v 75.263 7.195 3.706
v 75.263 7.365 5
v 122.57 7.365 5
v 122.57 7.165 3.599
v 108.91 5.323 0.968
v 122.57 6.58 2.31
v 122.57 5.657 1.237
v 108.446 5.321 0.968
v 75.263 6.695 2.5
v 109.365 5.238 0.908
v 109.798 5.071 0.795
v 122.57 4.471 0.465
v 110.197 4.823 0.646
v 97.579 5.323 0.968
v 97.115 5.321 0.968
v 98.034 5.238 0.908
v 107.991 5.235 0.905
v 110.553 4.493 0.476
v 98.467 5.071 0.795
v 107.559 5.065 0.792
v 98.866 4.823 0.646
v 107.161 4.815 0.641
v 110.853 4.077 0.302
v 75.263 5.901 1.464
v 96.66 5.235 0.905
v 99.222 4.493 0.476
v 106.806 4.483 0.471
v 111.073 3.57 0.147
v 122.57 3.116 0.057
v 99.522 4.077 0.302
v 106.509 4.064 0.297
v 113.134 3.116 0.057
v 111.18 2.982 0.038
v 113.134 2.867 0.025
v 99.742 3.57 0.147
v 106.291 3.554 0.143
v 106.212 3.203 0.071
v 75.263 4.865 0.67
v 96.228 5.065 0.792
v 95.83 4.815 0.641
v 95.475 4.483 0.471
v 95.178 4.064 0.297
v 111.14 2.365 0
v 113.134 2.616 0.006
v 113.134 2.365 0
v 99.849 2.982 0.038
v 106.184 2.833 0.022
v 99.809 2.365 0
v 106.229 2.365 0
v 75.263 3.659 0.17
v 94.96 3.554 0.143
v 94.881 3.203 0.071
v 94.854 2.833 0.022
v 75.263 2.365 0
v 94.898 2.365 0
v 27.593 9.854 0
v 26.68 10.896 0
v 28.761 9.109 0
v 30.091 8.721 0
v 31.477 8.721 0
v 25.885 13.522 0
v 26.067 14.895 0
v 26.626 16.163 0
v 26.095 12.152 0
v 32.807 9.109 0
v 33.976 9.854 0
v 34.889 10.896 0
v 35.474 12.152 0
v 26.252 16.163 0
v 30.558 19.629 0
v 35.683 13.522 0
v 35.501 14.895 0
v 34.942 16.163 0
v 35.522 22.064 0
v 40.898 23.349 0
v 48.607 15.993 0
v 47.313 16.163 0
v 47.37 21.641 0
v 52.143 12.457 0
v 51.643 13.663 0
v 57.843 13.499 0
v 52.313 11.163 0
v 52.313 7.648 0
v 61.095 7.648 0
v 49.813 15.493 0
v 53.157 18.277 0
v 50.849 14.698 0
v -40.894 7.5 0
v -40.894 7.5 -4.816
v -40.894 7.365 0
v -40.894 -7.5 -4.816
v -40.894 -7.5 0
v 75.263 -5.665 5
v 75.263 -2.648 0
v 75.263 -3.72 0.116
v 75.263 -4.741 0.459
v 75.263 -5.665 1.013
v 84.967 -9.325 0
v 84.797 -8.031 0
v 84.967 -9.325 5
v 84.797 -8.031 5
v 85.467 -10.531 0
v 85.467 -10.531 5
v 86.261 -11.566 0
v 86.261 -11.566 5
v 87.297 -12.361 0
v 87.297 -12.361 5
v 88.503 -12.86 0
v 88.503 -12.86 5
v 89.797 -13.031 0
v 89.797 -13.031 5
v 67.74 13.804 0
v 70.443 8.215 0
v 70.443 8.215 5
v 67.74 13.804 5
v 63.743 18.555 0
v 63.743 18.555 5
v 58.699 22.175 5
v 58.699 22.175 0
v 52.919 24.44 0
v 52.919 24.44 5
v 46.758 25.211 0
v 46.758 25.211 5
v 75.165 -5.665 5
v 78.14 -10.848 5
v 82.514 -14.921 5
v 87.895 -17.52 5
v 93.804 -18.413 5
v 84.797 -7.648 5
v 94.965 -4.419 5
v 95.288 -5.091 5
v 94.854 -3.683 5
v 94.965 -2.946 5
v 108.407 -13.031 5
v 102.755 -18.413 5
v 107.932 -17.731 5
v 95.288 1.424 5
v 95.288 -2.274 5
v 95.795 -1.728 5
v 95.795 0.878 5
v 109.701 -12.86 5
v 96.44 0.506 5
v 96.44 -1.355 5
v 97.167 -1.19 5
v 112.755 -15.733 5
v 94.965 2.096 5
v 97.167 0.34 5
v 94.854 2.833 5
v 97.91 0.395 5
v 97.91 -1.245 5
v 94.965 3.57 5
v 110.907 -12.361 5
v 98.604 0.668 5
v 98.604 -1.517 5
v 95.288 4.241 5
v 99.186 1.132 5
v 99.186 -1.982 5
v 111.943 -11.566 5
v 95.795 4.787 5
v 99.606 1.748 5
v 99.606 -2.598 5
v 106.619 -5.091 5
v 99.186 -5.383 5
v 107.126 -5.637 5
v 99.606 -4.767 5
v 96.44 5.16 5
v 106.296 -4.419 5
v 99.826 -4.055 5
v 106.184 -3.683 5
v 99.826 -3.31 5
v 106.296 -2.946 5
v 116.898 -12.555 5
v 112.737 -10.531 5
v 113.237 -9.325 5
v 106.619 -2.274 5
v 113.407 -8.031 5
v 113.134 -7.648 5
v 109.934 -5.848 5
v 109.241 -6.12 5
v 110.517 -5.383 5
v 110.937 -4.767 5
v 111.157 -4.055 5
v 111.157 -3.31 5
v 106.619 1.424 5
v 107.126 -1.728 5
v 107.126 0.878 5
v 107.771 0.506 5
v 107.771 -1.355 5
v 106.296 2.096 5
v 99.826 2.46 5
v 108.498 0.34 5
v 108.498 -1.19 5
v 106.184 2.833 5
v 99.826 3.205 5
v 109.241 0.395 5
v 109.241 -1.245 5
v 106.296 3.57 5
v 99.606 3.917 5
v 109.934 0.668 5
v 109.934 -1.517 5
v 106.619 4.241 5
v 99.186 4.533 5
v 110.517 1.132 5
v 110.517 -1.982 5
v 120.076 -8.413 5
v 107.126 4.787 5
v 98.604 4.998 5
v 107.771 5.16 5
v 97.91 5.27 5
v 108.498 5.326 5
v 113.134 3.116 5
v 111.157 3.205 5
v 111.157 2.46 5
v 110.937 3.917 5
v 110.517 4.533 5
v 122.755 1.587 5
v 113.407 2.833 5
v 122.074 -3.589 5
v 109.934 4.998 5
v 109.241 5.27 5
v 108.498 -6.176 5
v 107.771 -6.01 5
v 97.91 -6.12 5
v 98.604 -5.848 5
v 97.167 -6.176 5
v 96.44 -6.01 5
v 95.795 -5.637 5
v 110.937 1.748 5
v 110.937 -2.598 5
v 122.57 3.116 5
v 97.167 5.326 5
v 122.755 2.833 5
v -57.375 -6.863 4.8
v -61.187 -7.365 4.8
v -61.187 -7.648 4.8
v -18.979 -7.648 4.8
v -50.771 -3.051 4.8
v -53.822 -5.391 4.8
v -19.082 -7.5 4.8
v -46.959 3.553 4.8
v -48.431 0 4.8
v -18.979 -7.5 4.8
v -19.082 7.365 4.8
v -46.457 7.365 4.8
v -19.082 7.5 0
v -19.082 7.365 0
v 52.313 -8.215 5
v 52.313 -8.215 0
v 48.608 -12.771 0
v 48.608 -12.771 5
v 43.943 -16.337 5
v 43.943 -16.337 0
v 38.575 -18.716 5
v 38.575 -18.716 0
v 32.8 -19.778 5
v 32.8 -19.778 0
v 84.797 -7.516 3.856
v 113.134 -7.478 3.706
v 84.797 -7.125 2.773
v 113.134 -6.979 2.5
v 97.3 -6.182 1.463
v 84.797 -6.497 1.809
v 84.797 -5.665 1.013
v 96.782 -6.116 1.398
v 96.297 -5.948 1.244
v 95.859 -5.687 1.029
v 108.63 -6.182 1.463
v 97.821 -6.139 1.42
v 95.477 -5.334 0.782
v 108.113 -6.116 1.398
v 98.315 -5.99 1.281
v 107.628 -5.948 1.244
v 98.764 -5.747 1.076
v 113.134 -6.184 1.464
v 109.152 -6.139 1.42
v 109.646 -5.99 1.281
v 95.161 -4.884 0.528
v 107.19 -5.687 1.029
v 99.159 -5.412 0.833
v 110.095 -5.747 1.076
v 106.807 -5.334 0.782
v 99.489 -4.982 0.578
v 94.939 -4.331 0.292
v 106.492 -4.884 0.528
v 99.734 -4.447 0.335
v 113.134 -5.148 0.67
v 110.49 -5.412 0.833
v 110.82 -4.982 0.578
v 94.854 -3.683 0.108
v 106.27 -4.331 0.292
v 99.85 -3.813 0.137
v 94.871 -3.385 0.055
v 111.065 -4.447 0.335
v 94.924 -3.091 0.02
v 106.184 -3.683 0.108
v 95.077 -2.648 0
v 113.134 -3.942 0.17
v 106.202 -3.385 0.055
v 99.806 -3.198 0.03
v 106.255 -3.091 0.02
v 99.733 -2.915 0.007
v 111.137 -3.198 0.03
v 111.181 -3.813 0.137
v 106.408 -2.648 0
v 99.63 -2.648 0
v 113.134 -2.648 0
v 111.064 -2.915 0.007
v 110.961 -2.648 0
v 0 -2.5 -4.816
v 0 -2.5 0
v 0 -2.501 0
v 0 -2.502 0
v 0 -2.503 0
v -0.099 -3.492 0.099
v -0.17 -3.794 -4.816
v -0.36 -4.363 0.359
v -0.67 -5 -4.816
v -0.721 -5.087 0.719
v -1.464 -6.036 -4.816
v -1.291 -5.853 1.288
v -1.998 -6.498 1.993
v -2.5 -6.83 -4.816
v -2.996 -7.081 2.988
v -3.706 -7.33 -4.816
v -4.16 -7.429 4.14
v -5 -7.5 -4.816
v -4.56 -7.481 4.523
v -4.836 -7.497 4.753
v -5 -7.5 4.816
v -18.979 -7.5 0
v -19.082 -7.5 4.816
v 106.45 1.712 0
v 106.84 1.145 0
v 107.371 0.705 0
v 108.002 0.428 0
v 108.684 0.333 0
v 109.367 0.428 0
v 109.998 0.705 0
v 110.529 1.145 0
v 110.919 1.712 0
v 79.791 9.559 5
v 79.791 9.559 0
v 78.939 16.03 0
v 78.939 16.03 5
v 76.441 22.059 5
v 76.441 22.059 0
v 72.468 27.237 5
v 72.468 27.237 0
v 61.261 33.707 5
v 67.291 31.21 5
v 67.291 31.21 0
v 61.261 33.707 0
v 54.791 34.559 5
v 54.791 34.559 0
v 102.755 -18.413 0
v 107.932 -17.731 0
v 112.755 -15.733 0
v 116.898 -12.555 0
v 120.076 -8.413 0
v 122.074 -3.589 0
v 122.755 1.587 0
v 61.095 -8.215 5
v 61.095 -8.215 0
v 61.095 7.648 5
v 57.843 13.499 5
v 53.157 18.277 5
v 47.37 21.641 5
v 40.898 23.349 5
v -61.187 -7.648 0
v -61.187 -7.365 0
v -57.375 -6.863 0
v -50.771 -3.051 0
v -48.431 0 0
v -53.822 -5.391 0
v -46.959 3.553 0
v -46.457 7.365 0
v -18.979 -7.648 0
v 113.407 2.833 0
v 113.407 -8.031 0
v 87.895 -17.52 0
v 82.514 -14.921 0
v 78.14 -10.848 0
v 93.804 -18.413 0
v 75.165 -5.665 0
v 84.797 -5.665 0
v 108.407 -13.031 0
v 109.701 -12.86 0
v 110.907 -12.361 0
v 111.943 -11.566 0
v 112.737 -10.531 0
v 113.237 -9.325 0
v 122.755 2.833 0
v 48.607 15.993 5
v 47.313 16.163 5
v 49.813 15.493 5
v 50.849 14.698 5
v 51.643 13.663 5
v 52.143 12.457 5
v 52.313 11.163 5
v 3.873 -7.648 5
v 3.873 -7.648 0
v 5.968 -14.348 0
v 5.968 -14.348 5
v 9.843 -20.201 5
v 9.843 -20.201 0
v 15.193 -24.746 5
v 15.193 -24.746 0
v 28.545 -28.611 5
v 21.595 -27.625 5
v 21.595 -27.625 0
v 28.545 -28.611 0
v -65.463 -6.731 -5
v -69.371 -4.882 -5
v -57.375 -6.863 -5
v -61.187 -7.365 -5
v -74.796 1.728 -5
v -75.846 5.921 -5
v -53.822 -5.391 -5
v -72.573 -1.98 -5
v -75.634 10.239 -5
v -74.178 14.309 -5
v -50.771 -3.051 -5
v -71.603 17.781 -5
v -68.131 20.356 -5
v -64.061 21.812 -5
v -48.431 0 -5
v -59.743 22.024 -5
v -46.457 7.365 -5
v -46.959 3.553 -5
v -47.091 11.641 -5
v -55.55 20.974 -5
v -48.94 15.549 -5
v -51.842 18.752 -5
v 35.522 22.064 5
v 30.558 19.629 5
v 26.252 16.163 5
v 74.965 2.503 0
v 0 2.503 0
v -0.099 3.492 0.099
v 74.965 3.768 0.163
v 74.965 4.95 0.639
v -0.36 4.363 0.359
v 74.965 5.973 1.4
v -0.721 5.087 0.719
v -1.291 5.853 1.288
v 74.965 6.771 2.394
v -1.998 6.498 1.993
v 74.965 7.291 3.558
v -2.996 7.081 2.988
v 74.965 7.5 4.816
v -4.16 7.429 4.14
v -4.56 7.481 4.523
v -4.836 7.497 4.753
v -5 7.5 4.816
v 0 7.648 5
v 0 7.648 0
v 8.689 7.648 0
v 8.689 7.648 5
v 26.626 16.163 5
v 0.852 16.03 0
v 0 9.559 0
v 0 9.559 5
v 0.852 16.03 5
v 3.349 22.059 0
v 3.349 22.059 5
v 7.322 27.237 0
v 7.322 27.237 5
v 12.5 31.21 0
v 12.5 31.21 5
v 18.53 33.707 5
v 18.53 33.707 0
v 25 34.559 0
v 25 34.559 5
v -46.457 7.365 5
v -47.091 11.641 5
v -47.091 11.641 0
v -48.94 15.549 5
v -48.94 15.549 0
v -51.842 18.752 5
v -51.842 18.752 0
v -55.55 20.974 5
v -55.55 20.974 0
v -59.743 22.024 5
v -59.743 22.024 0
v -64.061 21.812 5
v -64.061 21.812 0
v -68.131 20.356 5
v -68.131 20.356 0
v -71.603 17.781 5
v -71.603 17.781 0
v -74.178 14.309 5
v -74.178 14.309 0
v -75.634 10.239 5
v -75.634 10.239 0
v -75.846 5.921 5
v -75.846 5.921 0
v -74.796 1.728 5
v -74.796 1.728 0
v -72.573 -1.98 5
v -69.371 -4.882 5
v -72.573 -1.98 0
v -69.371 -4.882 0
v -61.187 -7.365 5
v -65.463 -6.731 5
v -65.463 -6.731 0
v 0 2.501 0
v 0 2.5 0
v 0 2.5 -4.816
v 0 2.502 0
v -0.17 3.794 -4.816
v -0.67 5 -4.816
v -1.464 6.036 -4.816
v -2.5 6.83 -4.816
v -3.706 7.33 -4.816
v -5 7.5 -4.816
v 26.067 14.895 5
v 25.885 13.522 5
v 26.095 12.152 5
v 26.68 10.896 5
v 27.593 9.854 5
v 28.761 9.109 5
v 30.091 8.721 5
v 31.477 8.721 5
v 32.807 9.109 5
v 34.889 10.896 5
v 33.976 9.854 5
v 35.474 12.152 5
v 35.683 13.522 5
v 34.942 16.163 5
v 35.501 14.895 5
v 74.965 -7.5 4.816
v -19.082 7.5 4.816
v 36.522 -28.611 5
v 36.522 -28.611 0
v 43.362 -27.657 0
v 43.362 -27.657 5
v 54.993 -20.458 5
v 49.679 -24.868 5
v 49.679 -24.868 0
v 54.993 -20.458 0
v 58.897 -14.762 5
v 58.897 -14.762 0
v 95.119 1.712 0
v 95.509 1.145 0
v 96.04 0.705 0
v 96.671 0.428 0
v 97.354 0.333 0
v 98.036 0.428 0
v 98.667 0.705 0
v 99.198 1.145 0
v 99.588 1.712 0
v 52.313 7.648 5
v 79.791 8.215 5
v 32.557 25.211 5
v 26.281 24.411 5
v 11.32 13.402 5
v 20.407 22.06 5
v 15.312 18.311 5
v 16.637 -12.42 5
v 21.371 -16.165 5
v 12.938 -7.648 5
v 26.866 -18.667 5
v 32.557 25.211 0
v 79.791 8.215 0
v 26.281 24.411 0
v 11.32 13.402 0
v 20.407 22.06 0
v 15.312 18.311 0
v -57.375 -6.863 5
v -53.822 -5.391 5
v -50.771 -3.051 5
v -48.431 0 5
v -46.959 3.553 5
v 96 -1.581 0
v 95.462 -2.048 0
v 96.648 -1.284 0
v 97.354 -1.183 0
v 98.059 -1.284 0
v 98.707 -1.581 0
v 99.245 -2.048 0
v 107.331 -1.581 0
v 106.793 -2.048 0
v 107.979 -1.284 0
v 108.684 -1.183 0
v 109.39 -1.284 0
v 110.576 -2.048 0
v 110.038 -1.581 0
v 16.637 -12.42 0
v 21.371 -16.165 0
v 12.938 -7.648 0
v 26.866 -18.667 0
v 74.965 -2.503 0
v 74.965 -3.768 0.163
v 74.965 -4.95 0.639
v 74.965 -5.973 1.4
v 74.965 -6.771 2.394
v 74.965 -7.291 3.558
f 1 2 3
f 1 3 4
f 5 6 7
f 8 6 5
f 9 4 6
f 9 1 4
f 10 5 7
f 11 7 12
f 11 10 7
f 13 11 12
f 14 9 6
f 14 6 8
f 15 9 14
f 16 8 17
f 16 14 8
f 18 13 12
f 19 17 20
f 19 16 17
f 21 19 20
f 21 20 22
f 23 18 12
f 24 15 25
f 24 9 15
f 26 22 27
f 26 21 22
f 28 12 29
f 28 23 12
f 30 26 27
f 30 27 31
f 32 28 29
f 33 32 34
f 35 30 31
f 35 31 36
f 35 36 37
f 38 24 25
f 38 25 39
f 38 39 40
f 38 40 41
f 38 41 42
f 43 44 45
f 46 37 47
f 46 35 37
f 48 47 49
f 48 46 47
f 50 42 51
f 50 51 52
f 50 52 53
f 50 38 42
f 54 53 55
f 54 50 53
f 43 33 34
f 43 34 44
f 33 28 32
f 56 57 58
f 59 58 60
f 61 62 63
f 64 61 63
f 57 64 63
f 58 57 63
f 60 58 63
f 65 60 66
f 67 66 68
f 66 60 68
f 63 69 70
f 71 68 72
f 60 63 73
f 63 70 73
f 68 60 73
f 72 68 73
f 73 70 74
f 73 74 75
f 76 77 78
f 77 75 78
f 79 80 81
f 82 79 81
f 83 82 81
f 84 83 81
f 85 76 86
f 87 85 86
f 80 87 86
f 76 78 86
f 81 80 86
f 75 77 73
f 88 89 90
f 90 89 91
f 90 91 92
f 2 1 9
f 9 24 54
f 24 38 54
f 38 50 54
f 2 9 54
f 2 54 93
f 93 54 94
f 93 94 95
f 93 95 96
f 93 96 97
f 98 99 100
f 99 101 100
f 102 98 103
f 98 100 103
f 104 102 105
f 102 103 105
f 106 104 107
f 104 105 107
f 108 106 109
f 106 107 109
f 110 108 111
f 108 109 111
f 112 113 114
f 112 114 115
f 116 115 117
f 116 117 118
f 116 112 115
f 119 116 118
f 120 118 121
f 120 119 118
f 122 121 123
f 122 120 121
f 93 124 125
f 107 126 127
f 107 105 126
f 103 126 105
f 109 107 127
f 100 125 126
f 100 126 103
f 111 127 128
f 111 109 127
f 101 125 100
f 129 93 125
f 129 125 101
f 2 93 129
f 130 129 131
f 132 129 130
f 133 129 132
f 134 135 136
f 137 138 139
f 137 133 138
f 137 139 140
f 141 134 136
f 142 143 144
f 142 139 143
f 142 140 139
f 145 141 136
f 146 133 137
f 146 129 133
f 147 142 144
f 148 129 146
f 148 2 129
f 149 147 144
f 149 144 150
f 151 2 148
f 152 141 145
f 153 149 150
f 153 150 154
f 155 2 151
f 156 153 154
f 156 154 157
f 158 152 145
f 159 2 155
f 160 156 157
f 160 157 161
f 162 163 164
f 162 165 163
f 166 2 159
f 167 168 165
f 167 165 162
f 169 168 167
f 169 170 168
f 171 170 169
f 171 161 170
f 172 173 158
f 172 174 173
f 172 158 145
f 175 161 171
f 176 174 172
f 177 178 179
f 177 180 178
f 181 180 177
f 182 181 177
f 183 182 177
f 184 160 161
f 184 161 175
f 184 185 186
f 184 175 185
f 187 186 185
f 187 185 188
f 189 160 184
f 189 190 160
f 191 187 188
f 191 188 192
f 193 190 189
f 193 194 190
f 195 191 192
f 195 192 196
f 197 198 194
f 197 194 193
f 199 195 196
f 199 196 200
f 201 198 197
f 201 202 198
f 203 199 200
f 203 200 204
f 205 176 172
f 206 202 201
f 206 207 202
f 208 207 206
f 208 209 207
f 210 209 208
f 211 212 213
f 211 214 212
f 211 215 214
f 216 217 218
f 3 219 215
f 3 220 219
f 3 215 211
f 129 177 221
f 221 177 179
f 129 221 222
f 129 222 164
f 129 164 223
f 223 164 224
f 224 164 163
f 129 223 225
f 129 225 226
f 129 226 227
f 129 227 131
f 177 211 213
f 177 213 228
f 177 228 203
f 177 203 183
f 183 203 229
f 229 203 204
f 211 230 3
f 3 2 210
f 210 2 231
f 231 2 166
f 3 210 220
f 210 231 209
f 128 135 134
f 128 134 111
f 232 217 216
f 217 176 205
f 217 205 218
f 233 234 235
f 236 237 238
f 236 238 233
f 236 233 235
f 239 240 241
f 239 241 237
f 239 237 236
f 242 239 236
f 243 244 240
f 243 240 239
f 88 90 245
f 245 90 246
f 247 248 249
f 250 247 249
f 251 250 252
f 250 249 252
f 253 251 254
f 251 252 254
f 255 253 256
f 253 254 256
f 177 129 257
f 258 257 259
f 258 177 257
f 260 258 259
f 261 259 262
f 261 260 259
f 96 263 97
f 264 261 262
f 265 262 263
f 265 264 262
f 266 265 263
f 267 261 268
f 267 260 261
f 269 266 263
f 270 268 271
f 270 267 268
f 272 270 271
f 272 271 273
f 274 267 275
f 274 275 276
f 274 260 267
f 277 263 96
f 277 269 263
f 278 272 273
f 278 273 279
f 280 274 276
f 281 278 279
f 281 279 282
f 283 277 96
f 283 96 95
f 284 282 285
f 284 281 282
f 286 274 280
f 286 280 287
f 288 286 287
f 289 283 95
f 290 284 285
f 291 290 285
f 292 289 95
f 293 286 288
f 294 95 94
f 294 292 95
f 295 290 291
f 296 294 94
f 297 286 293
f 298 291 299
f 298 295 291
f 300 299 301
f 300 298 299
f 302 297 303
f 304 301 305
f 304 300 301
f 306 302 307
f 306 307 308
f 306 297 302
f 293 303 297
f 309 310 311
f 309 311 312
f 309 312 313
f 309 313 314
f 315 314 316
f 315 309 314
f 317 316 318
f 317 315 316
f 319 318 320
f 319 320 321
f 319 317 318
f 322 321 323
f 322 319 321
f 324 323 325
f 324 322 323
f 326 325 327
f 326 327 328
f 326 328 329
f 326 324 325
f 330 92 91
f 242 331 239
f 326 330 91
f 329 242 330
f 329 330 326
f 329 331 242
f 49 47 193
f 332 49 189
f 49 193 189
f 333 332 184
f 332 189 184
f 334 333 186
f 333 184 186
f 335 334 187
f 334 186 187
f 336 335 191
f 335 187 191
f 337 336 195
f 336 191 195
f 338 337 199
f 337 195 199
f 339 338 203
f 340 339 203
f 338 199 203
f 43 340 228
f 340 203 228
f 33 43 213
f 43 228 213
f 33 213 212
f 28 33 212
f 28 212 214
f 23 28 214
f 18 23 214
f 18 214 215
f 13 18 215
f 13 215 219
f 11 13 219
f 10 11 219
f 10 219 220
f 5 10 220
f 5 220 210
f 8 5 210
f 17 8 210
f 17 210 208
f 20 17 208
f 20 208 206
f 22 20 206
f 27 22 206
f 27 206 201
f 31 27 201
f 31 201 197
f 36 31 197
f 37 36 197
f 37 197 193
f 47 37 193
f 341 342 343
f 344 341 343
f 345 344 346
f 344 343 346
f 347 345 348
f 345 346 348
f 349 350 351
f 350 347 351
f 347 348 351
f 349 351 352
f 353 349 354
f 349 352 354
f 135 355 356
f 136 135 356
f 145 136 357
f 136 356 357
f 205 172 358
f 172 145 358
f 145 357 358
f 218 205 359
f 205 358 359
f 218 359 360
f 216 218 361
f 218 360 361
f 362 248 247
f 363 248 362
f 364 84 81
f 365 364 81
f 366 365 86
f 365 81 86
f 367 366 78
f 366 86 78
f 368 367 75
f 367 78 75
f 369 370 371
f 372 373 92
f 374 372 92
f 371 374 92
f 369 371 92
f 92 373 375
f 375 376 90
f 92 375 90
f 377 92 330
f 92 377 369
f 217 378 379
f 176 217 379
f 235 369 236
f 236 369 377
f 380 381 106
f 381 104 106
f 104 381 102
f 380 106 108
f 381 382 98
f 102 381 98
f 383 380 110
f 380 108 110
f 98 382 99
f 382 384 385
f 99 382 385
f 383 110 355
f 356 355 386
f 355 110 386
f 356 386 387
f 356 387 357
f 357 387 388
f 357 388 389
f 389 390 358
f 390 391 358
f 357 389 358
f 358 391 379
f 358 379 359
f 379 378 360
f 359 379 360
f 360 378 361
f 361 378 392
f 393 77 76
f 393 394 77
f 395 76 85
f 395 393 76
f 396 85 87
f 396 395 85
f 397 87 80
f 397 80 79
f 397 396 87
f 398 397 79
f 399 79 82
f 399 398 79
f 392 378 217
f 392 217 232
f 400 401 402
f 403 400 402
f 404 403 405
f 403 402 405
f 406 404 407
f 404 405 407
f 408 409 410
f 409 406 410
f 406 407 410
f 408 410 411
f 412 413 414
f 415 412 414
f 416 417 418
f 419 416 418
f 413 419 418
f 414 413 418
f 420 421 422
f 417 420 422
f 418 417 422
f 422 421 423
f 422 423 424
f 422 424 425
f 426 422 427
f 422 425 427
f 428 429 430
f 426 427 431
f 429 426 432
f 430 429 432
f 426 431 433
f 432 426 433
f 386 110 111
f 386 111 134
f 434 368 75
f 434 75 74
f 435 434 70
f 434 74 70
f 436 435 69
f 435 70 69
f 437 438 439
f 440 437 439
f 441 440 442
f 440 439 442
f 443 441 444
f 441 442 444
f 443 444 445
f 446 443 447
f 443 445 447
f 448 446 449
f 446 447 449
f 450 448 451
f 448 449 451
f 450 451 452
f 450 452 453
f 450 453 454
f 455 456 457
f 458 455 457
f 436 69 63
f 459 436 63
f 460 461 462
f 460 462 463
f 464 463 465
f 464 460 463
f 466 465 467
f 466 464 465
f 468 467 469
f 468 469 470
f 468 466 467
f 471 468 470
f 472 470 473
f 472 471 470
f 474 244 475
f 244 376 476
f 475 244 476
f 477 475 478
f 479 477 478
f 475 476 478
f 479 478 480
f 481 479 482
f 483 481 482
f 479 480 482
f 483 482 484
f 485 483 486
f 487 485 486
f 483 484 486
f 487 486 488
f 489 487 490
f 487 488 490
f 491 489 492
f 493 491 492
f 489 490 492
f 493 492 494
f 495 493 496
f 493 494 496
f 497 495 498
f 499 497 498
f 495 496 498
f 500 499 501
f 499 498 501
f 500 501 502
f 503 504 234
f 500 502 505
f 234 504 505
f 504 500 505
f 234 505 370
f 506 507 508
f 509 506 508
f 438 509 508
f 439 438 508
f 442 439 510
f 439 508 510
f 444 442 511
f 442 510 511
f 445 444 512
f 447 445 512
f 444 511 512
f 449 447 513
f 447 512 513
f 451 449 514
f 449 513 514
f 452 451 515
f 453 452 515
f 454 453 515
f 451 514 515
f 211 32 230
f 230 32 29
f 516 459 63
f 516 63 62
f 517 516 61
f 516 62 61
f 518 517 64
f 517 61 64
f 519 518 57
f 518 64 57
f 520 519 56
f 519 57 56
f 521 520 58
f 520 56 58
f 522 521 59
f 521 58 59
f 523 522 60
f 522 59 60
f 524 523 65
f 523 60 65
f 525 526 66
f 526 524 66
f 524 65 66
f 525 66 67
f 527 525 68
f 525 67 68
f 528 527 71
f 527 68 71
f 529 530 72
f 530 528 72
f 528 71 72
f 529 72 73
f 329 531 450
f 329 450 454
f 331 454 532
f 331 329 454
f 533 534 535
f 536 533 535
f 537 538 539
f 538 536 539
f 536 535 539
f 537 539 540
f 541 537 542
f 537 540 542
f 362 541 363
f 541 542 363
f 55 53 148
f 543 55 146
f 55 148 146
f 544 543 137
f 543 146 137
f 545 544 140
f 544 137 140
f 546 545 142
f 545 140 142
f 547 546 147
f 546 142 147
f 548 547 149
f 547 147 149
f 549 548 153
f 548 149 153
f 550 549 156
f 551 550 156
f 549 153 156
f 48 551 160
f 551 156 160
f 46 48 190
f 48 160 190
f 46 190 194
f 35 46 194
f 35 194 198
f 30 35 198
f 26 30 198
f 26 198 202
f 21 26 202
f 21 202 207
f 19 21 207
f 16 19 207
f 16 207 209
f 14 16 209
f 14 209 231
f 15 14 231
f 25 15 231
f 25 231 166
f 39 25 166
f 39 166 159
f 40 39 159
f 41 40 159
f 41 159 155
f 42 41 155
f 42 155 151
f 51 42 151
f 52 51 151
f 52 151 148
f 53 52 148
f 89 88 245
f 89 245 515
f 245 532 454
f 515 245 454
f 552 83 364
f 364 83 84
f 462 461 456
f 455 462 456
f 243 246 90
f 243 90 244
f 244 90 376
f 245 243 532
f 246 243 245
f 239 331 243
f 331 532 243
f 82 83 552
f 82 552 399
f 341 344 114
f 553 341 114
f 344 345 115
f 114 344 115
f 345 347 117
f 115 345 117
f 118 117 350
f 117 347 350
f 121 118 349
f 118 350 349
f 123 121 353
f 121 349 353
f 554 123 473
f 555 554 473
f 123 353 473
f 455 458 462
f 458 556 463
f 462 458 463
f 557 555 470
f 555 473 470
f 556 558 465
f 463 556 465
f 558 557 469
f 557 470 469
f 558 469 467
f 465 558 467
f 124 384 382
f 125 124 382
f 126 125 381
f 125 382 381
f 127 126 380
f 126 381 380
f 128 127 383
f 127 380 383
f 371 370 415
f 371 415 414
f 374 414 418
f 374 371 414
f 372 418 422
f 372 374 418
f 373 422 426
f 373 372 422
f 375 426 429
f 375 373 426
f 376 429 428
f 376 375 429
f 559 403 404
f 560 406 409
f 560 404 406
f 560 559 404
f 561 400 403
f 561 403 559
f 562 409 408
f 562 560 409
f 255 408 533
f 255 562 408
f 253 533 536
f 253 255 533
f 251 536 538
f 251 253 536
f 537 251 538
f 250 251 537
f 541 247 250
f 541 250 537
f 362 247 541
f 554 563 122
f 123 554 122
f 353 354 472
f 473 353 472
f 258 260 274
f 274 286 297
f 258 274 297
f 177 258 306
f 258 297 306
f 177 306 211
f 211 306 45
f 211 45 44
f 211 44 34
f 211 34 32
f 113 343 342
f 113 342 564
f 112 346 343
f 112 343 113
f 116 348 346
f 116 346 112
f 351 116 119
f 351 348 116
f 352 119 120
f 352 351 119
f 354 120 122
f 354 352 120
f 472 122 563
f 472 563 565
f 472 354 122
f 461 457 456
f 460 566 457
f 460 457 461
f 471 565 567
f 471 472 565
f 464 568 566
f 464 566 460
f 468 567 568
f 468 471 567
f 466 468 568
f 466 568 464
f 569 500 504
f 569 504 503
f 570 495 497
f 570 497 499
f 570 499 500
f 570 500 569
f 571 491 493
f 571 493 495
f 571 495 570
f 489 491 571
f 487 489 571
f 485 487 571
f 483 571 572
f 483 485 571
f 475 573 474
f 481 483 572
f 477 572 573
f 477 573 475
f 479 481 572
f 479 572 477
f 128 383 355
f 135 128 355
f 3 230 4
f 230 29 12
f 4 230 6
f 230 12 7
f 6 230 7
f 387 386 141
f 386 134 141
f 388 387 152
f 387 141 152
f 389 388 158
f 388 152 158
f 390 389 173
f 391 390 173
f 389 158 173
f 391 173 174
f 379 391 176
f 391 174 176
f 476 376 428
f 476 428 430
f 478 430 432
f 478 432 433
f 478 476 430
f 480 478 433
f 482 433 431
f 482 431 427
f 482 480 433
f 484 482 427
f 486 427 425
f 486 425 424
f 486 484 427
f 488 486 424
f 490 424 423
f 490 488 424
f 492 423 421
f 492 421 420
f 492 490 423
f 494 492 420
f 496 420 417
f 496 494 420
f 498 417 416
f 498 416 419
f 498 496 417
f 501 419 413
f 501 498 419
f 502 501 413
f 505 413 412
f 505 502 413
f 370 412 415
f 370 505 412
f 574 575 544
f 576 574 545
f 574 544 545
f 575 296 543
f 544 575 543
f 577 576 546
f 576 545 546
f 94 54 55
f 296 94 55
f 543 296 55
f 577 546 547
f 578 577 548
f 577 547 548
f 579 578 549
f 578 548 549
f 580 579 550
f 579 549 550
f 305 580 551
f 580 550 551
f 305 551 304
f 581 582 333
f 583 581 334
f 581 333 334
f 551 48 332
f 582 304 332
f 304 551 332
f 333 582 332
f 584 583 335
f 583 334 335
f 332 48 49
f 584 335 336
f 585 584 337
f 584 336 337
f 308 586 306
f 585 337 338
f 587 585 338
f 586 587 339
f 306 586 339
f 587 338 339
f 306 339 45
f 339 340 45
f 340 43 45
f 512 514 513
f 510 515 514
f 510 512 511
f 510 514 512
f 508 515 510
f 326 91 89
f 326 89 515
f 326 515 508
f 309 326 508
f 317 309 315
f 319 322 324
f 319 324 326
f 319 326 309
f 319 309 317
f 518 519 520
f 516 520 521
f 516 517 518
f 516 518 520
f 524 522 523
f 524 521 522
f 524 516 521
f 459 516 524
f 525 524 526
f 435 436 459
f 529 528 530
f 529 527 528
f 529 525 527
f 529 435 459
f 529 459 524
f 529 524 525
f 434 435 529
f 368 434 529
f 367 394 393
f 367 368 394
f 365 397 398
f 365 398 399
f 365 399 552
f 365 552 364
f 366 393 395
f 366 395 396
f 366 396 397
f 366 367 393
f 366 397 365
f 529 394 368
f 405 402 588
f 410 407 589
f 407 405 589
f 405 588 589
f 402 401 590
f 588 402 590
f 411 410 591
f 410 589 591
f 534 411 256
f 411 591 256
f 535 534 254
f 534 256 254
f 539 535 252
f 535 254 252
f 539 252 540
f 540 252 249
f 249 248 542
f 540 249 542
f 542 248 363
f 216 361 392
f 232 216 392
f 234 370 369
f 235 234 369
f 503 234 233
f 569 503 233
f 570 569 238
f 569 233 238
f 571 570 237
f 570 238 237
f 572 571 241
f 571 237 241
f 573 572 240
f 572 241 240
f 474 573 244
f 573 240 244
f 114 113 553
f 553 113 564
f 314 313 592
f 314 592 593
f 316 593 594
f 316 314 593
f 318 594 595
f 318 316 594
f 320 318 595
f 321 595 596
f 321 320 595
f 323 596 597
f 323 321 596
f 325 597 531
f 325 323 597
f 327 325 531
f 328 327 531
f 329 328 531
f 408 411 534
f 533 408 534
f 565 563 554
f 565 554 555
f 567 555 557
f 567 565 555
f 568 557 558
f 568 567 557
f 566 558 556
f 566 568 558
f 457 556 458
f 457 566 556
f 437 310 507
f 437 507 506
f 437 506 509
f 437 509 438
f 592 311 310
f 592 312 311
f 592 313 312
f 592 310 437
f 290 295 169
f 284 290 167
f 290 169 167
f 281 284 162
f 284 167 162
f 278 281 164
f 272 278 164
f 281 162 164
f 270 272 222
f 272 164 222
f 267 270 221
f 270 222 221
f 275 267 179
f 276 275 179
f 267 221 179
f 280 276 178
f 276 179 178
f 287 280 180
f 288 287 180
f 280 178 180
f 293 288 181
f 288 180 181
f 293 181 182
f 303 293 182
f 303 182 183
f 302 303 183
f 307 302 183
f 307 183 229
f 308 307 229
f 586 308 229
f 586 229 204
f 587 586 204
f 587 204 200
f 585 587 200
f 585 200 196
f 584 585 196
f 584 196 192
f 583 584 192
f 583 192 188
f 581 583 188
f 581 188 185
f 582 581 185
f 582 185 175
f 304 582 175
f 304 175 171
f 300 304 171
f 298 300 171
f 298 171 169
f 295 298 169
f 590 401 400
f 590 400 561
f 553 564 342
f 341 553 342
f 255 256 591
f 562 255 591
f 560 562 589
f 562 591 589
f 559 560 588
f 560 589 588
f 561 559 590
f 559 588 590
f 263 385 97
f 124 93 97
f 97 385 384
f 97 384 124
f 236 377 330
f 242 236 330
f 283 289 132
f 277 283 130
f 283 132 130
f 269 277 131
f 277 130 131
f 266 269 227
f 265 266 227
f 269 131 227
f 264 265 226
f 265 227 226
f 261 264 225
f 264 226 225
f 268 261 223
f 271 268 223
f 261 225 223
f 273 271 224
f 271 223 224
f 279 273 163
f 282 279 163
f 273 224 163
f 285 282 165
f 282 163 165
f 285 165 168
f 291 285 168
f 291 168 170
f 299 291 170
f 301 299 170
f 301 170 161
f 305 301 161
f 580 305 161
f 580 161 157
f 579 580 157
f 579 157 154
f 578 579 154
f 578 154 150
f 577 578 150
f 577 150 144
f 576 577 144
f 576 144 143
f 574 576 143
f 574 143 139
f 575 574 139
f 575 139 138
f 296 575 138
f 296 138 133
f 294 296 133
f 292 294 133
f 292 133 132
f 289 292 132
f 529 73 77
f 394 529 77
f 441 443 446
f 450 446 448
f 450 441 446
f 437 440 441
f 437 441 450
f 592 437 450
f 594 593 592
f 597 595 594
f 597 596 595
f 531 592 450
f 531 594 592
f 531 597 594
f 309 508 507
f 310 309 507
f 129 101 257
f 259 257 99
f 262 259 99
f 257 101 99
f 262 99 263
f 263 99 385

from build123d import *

# Parameters (mm, degrees)
F0_W           = 74.9647691846
F0_H           = 4.8156478442
F0_W_2         = 21.8120515347
F1_DEPTH       = 7.5
F2_T1_DEPTH    = 87.4562698657
F2_T3_DEPTH    = 17.3156478442
F2_T9_DEPTH    = 87.4562698657
F2_T13_DEPTH   = 17.3156478442
F2_T21_DEPTH   = 87.4562698657
F2_T25_DEPTH   = 17.3156478442
F4_DEPTH       = 4.8
F5_DEPTH       = 5
F6_W           = 9.4357505441
F6_H           = 4.2491005734
F7_DEPTH       = 5
F8_R           = 4.99999
F9_W           = 9.3480274081
F9_H           = 5.3821951151
F9_W_2         = 9.3480348587
F9_H_2         = 4.8156473786
F9_H_3         = 5.5238311179
F9_W_3         = 28.6106020212
F10_DEPTH      = 5
F11_T1_DEPTH   = 98.1931302685
F11_T3_DEPTH   = 105
F13_D          = 5
F14_D          = 5
F15_D          = 5
F16_D          = 5
F17_W          = 9.3480274081
F17_H          = 16.9964022934
F17_W_2        = 61.7535989732
F17_H_2        = 9.3480236828
F18_DEPTH      = 5
F17_W_3        = 9.0647486504
F17_H_3        = 12.1807572432
F17_H_4        = 8.7814740837
F17_W_4        = 39.374999702
F17_W_5        = 8.7814815342
F17_H_5        = 11.6142109036
F17_H_6        = 8.5145081393
F17_W_6        = 26.0611474514
F17_H_7        = 7.3767574504
F19_T1_DEPTH   = 5
F19_T3_DEPTH   = 5
F19_T5_DEPTH   = 130
F19_T7_DEPTH   = 130
F19_2_T1_DEPTH = 5
F19_2_T3_DEPTH = 127.8617396979
F19_2_T5_DEPTH = 128.3588691726
F19_3_T1_DEPTH = 121.4077915609
F19_3_T3_DEPTH = 93.6596472526
F20_R          = 4.8994331179
F21_DEPTH      = 5
F22_R          = 5
F22_2_R        = 5


# Not quite as in the source:
# - a fillet or chamfer that OpenCascade refuses, or shapes differently, is made with other operations: its cross-section is extruded or revolved along the edge and cut away or added
# - a fillet or chamfer is up to 0.001 mm smaller than in the source, because OpenCascade refuses the exact size


with BuildPart() as f1:
    # F0 (on Front) → F1 (new body, symmetric)
    with BuildSketch(Plane.XZ):
        with Locations((37.4823845923, 2.4078239221)):
            Rectangle(F0_W, F0_H)
        Polygon((0, -4.8156478442), (0, 0), (0, 4.8156478442), (-19.0819986165, 4.8156478442), (-19.0819986165, 0), (-19.0819986165, -4.8156478442), align=None)
        with Locations((-29.9880243838, -2.4078239221)):
            Rectangle(F0_W_2, F0_H)
    extrude(amount=F1_DEPTH, both=True)

    # F2: fillet of radius 5 on 4 edges, made by hand

    # F2_s2 → F2_t1 (cut)
    with BuildSketch(Plane.YZ):
        with BuildLine():
            ThreePointArc((-2.5033997275, 0), (-5.9731431778, 1.3998777258), (-7.5, 4.8156478442))
            Line((-7.5, 4.8156478442), (-7.5, 0))
            Line((-7.5, 0), (-2.5033997275, 0))
        make_face()
        with BuildLine():
            ThreePointArc((2.5033997275, 0), (5.9731431778, 1.3998777258), (7.5, 4.8156478442))
            Line((7.5, 4.8156478442), (7.5, 0))
            Line((7.5, 0), (2.5033997275, 0))
        make_face()
    extrude(amount=F2_T1_DEPTH, mode=Mode.SUBTRACT)

    # F2_s4 → F2_t3 (cut)
    with BuildSketch(Plane.XY.offset(-17.3156478442)):
        with BuildLine():
            ThreePointArc((0, -2.5), (-1.4644660941, -6.0355339059), (-5, -7.5))
            Line((-5, -7.5), (0, -7.5))
            Line((0, -7.5), (0, -2.5))
        make_face()
        with BuildLine():
            ThreePointArc((0, 2.5), (-1.4644660941, 6.0355339059), (-5, 7.5))
            Line((-5, 7.5), (0, 7.5))
            Line((0, 7.5), (0, 2.5))
        make_face()
    extrude(amount=F2_T3_DEPTH, mode=Mode.SUBTRACT)


with BuildPart() as f2_tool7:
    # F2_s8 → F2_t9 (new body)
    with BuildSketch(Plane.YZ.offset(-12.4915006811)):
        with BuildLine():
            ThreePointArc((-2.5033997275, 0), (-5.9731431778, 1.3998777258), (-7.5, 4.8156478442))
            Line((-7.5, 4.8156478442), (-7.5, 0))
            Line((-7.5, 0), (-2.5033997275, 0))
        make_face()
    extrude(amount=F2_T9_DEPTH)

    split(bisect_by=Plane.YZ, keep=Keep.BOTTOM)


with BuildPart() as f2_tool11:
    # F2_s12 → F2_t13 (new body)
    with BuildSketch(Plane.XY.offset(-4.8156478442)):
        with BuildLine():
            ThreePointArc((0, -2.5), (-1.4644660941, -6.0355339059), (-5, -7.5))
            Line((-5, -7.5), (0, -7.5))
            Line((0, -7.5), (0, -2.5))
        make_face()
    extrude(amount=F2_T13_DEPTH)

    split(bisect_by=Plane.XY, keep=Keep.TOP)

    split(bisect_by=Plane.XY.offset(4.8156478442), keep=Keep.BOTTOM)


with BuildPart() as f2_tool7_1:
    add(f2_tool7.part)

    # F2_t16: intersect F2_tool11
    add(f2_tool11.part, mode=Mode.INTERSECT)


with BuildPart() as f1_1:
    add(f1.part)

    # F2_t5: cut F2_tool7
    add(f2_tool7_1.part, mode=Mode.SUBTRACT)


with BuildPart() as f2_tool19:
    # F2_s20 → F2_t21 (new body)
    with BuildSketch(Plane.YZ.offset(-12.4915006811)):
        with BuildLine():
            ThreePointArc((2.5033997275, 0), (5.9731431778, 1.3998777258), (7.5, 4.8156478442))
            Line((7.5, 4.8156478442), (7.5, 0))
            Line((7.5, 0), (2.5033997275, 0))
        make_face()
    extrude(amount=F2_T21_DEPTH)

    split(bisect_by=Plane.YZ, keep=Keep.BOTTOM)


with BuildPart() as f2_tool23:
    # F2_s24 → F2_t25 (new body)
    with BuildSketch(Plane.XY.offset(-4.8156478442)):
        with BuildLine():
            ThreePointArc((0, 2.5), (-1.4644660941, 6.0355339059), (-5, 7.5))
            Line((-5, 7.5), (0, 7.5))
            Line((0, 7.5), (0, 2.5))
        make_face()
    extrude(amount=F2_T25_DEPTH)

    split(bisect_by=Plane.XY, keep=Keep.TOP)

    split(bisect_by=Plane.XY.offset(4.8156478442), keep=Keep.BOTTOM)


with BuildPart() as f2_tool19_1:
    add(f2_tool19.part)

    # F2_t28: intersect F2_tool23
    add(f2_tool23.part, mode=Mode.INTERSECT)


with BuildPart() as f1_2:
    add(f1_1.part)

    # F2_t17: cut F2_tool19
    add(f2_tool19_1.part, mode=Mode.SUBTRACT)

    # F3 (on Top) → F4 (join)
    with BuildSketch(Plane.XY):
        with BuildLine():
            Line((-61.1870549619, -7.6483818702), (-18.97931844, -7.6483818702))
            Line((-18.97931844, -7.6483818702), (-18.97931844, 7.3651091661))
            Line((-18.97931844, 7.3651091661), (-46.4570610243, 7.3651091661))
            ThreePointArc((-46.4570610243, 7.3651091661), (-50.7713763618, -3.050569434), (-61.1870549619, -7.3648847715))
            Line((-61.1870549619, -7.3648847715), (-61.1870549619, -7.6483818702))
        make_face()
    extrude(amount=F4_DEPTH)

    # F3 (on Top) → F5 (join, symmetric)
    with BuildSketch(Plane.XY):
        with BuildLine():
            ThreePointArc((-46.4570610243, 7.3651091661), (-71.602733562, 17.7807877663), (-61.1870549619, -7.3648847715))
            Line((-61.1870549619, -7.3648847715), (-61.1870549619, 7.3651091661))
            Line((-61.1870549619, 7.3651091661), (-46.4570610243, 7.3651091661))
        make_face()
        with BuildLine():
            Line((-61.1870549619, 7.3651091661), (-61.1870549619, -7.3648847715))
            ThreePointArc((-61.1870549619, -7.3648847715), (-50.7713763618, -3.050569434), (-46.4570610243, 7.3651091661))
            Line((-46.4570610243, 7.3651091661), (-61.1870549619, 7.3651091661))
        make_face()
    extrude(amount=F5_DEPTH, both=True)


with BuildPart() as f7:
    # F6 (on Top) → F7 (new body)
    with BuildSketch(Plane.XY):
        Polygon((75.2632021904, 7.365108002), (75.2632021904, -7.6483818702), (113.1341084838, -7.6483818702), (113.1341084838, 3.1160074286), (113.1341084838, 7.365108002), align=None)
        with Locations((117.8519837558, 5.2405577153)):
            Rectangle(F6_W, F6_H)
    extrude(amount=F7_DEPTH)

    # F8 (radius 5 in the source; OpenCascade refuses exactly that, so slightly less here)
    f8_edges = [f7.edges().sort_by_distance(p)[0] for p in [
        (94.198655, -7.648382, 0),
        (98.916531, 7.365108, 0),
    ]]
    fillet(f8_edges, radius=F8_R)

    # F9 (on Top) → F10 (join)
    with BuildSketch(Plane.XY):
        with Locations((80.1227204502, -15.7216731459)):
            Rectangle(F9_W, F9_H)
        Polygon((75.4487067461, -13.0305755883), (84.7967341542, -13.0305755883), (84.7967341542, -5.665468052), (75.1654356718, -5.665468052), (75.1654356718, -18.4127707034), (75.4487067461, -18.4127707034), align=None)
        with Locations((118.0813536048, -15.7216731459)):
            Rectangle(F9_W_2, F9_H)
        with Locations((118.0813536048, -10.6227518991)):
            Rectangle(F9_W_2, F9_H_2)
        with Locations((118.0813536048, -5.4530126508)):
            Rectangle(F9_W_2, F9_H_3)
        with Locations((118.0813536048, 0.0708184671)):
            Rectangle(F9_W_2, F9_H_3)
        with Locations((99.1020351648, -15.7216731459)):
            Rectangle(F9_W_3, F9_H)
    extrude(amount=F10_DEPTH)

    # F11: fillet of radius 20 on 2 edges, made by hand

    # F11_s2 → F11_t1 (cut)
    with BuildSketch(Plane.XY.offset(-46.5965651343)):
        with BuildLine():
            ThreePointArc((75.1654356718, -5.665468052), (82.5136664041, -14.9211617058), (93.8040617255, -18.4127707034))
            Line((93.8040617255, -18.4127707034), (75.1654356718, -18.4127707034))
            Line((75.1654356718, -18.4127707034), (75.1654356718, -5.665468052))
        make_face()
    extrude(amount=F11_T1_DEPTH, mode=Mode.SUBTRACT)

    # F11_s4 → F11_t3 (cut)
    with BuildSketch(Plane.XY.offset(-50)):
        with BuildLine():
            ThreePointArc((102.7553710341, -18.4127707034), (116.8975066579, -12.5549063272), (122.7553710341, 1.5872292966))
            Line((122.7553710341, 1.5872292966), (122.7553710341, -18.4127707034))
            Line((122.7553710341, -18.4127707034), (102.7553710341, -18.4127707034))
        make_face()
    extrude(amount=F11_T3_DEPTH, mode=Mode.SUBTRACT)

    # F13 (through all)
    with Locations(Plane(origin=(0, 0, 0), x_dir=(1, 0, 0), z_dir=(0, 0, -1))):
        with Locations((97.3535180092, -2.832734026)):
            Hole(F13_D / 2)

    # F14 (through all)
    with Locations(Plane(origin=(0, 0, 0), x_dir=(1, 0, 0), z_dir=(0, 0, -1))):
        with Locations((97.3535180092, 3.682554001)):
            Hole(F14_D / 2)

    # F15 (through all)
    with Locations(Plane(origin=(0, 0, 0), x_dir=(1, 0, 0), z_dir=(0, 0, -1))):
        with Locations((108.684450388, -2.832734026)):
            Hole(F15_D / 2)

    # F16 (through all)
    with Locations(Plane(origin=(0, 0, 0), x_dir=(1, 0, 0), z_dir=(0, 0, -1))):
        with Locations((108.684450388, 3.682554001)):
            Hole(F16_D / 2)

    # F22
    f22_edges = [f7.edges().sort_by_distance(p)[0] for p in [
        (113.407336, -13.030576, 2.5),
        (84.796734, -13.030576, 2.5),
    ]]
    fillet(f22_edges, radius=F22_R)


with BuildPart() as f18:
    # F17 (on Top) → F18 (new body)
    with BuildSketch(Plane.XY):
        with Locations((75.1165561378, 16.7131293565)):
            Rectangle(F17_W, F17_H)
        with Locations((39.5657429472, 29.8853423446)):
            Rectangle(F17_W_2, F17_H_2)
        with Locations((75.1165561378, 29.8853423446)):
            Rectangle(F17_W, F17_H_2)
        Polygon((8.6889434606, 7.6483818702), (8.6889434606, 25.2113305032), (8.6889434606, 34.5593541861), (0, 34.5593541861), (0, 7.6483818702), align=None)
    extrude(amount=F18_DEPTH)

    # F19: fillet of radius 25 on 4 edges, made by hand

    # F19_s2 → F19_t1 (join)
    with BuildSketch(Plane.XY):
        with BuildLine():
            ThreePointArc((70.4425424337, 8.2149282098), (61.3341564874, 20.5225336023), (46.7583193358, 25.2113305032))
            Line((46.7583193358, 25.2113305032), (70.4425424337, 25.2113305032))
            Line((70.4425424337, 25.2113305032), (70.4425424337, 8.2149282098))
        make_face()
    extrude(amount=F19_T1_DEPTH)

    # F19_s4 → F19_t3 (join)
    with BuildSketch(Plane.XY):
        with BuildLine():
            ThreePointArc((32.5571287071, 25.2113305032), (17.740352475, 20.3474458706), (8.6889434606, 7.6483818702))
            Line((8.6889434606, 7.6483818702), (8.6889434606, 25.2113305032))
            Line((8.6889434606, 25.2113305032), (32.5571287071, 25.2113305032))
        make_face()
    extrude(amount=F19_T3_DEPTH)

    # F19_s6 → F19_t5 (cut)
    with BuildSketch(Plane.XY.offset(-62.5)):
        with BuildLine():
            ThreePointArc((79.7905698419, 9.5593541861), (72.4682393715, 27.2370237157), (54.7905698419, 34.5593541861))
            Line((54.7905698419, 34.5593541861), (79.7905698419, 34.5593541861))
            Line((79.7905698419, 34.5593541861), (79.7905698419, 9.5593541861))
        make_face()
    extrude(amount=F19_T5_DEPTH, mode=Mode.SUBTRACT)

    # F19_s8 → F19_t7 (cut)
    with BuildSketch(Plane.XY.offset(-62.5)):
        with BuildLine():
            ThreePointArc((0, 9.5593541861), (7.3223304703, 27.2370237157), (25, 34.5593541861))
            Line((25, 34.5593541861), (0, 34.5593541861))
            Line((0, 34.5593541861), (0, 9.5593541861))
        make_face()
    extrude(amount=F19_T7_DEPTH, mode=Mode.SUBTRACT)


with BuildPart() as f18b:
    # F17 (on Top) → F18, piece 2 (new body)
    with BuildSketch(Plane.XY):
        with Locations((8.4056706401, -13.7387604918)):
            Rectangle(F17_W_3, F17_H_3)
        with Locations((8.4056706401, -24.2198761553)):
            Rectangle(F17_W_3, F17_H_4)
        with Locations((32.6255448163, -24.2198761553)):
            Rectangle(F17_W_4, F17_H_4)
        with Locations((56.7037854344, -14.0220336616)):
            Rectangle(F17_W_5, F17_H_5)
        with Locations((56.7037854344, -24.2198761553)):
            Rectangle(F17_W_5, F17_H_4)
    extrude(amount=F18_DEPTH)

    # F19#2: fillet of radius 25 on 4 edges, made by hand

    # F19_2_s2 → F19_2_t1 (join)
    with BuildSketch(Plane.XY):
        with BuildLine():
            ThreePointArc((52.3130446672, -8.2149282098), (43.2475475071, -16.7339870632), (31.1985792402, -19.8291391134))
            Line((31.1985792402, -19.8291391134), (52.3130446672, -19.8291391134))
            Line((52.3130446672, -19.8291391134), (52.3130446672, -8.2149282098))
        make_face()
        with BuildLine():
            ThreePointArc((34.4011997926, -19.8291391134), (22.0618535563, -16.571736347), (12.9380449653, -7.6483818702))
            Line((12.9380449653, -7.6483818702), (12.9380449653, -19.8291391134))
            Line((12.9380449653, -19.8291391134), (34.4011997926, -19.8291391134))
        make_face()
    extrude(amount=F19_2_T1_DEPTH)

    # F19_2_s4 → F19_2_t3 (cut)
    with BuildSketch(Plane.XY.offset(-61.430869849)):
        with BuildLine():
            ThreePointArc((36.5221782619, -28.6106131971), (52.4892087417, -22.8473992503), (61.0945262015, -8.2149282098))
            Line((61.0945262015, -8.2149282098), (61.0945262015, -28.6106131971))
            Line((61.0945262015, -28.6106131971), (36.5221782619, -28.6106131971))
        make_face()
    extrude(amount=F19_2_T3_DEPTH, mode=Mode.SUBTRACT)

    # F19_2_s6 → F19_2_t5 (cut)
    with BuildSketch(Plane.XY.offset(-61.6794345863)):
        with BuildLine():
            ThreePointArc((3.8732963149, -7.6483818702), (12.3577945421, -22.662440102), (28.5450701494, -28.6106131971))
            Line((28.5450701494, -28.6106131971), (3.8732963149, -28.6106131971))
            Line((3.8732963149, -28.6106131971), (3.8732963149, -7.6483818702))
        make_face()
    extrude(amount=F19_2_T5_DEPTH, mode=Mode.SUBTRACT)


with BuildPart() as f18c:
    # F17 (on Top) → F18, piece 3 (new body)
    with BuildSketch(Plane.XY):
        with Locations((56.7037854344, 11.9056359399)):
            Rectangle(F17_W_5, F17_H_6)
        with Locations((39.2824709415, 19.8512687348)):
            Rectangle(F17_W_6, F17_H_7)
        with Locations((56.7037854344, 19.8512687348)):
            Rectangle(F17_W_5, F17_H_7)
    extrude(amount=F18_DEPTH)

    # F19#3: fillet of radius 25 on 2 edges, made by hand

    # F19_3_s2 → F19_3_t1 (cut)
    with BuildSketch(Plane.XY.offset(-58.2038957804)):
        with BuildLine():
            ThreePointArc((61.0945262015, 7.6483818702), (51.9069673171, 19.1881142343), (37.8129678893, 23.53964746))
            Line((37.8129678893, 23.53964746), (61.0945262015, 23.53964746))
            Line((61.0945262015, 23.53964746), (61.0945262015, 7.6483818702))
        make_face()
    extrude(amount=F19_3_T1_DEPTH, mode=Mode.SUBTRACT)

    # F19_3_s4 → F19_3_t3 (cut)
    with BuildSketch(Plane.XY.offset(-44.3298236263)):
        with BuildLine():
            ThreePointArc((43.9838266664, 23.53964746), (34.3812505469, 21.6219032395), (26.2518972158, 16.1628900096))
            Line((26.2518972158, 16.1628900096), (26.2518972158, 23.53964746))
            Line((26.2518972158, 23.53964746), (43.9838266664, 23.53964746))
        make_face()
    extrude(amount=F19_3_T3_DEPTH, mode=Mode.SUBTRACT)

    # F20 (on Top) → F21 (join)
    with BuildSketch(Plane.XY):
        with Locations((30.7842679322, 13.5714998469)):
            Circle(F20_R)
    extrude(amount=F21_DEPTH)

    # F22#2
    f22_2_edges = [f18c.edges().sort_by_distance(p)[0] for p in [
        (52.313045, 16.16289, 2.5),
    ]]
    fillet(f22_2_edges, radius=F22_2_R)


solid = Compound([f1_2.part, f7.part, f18.part, f18b.part, f18c.part])
